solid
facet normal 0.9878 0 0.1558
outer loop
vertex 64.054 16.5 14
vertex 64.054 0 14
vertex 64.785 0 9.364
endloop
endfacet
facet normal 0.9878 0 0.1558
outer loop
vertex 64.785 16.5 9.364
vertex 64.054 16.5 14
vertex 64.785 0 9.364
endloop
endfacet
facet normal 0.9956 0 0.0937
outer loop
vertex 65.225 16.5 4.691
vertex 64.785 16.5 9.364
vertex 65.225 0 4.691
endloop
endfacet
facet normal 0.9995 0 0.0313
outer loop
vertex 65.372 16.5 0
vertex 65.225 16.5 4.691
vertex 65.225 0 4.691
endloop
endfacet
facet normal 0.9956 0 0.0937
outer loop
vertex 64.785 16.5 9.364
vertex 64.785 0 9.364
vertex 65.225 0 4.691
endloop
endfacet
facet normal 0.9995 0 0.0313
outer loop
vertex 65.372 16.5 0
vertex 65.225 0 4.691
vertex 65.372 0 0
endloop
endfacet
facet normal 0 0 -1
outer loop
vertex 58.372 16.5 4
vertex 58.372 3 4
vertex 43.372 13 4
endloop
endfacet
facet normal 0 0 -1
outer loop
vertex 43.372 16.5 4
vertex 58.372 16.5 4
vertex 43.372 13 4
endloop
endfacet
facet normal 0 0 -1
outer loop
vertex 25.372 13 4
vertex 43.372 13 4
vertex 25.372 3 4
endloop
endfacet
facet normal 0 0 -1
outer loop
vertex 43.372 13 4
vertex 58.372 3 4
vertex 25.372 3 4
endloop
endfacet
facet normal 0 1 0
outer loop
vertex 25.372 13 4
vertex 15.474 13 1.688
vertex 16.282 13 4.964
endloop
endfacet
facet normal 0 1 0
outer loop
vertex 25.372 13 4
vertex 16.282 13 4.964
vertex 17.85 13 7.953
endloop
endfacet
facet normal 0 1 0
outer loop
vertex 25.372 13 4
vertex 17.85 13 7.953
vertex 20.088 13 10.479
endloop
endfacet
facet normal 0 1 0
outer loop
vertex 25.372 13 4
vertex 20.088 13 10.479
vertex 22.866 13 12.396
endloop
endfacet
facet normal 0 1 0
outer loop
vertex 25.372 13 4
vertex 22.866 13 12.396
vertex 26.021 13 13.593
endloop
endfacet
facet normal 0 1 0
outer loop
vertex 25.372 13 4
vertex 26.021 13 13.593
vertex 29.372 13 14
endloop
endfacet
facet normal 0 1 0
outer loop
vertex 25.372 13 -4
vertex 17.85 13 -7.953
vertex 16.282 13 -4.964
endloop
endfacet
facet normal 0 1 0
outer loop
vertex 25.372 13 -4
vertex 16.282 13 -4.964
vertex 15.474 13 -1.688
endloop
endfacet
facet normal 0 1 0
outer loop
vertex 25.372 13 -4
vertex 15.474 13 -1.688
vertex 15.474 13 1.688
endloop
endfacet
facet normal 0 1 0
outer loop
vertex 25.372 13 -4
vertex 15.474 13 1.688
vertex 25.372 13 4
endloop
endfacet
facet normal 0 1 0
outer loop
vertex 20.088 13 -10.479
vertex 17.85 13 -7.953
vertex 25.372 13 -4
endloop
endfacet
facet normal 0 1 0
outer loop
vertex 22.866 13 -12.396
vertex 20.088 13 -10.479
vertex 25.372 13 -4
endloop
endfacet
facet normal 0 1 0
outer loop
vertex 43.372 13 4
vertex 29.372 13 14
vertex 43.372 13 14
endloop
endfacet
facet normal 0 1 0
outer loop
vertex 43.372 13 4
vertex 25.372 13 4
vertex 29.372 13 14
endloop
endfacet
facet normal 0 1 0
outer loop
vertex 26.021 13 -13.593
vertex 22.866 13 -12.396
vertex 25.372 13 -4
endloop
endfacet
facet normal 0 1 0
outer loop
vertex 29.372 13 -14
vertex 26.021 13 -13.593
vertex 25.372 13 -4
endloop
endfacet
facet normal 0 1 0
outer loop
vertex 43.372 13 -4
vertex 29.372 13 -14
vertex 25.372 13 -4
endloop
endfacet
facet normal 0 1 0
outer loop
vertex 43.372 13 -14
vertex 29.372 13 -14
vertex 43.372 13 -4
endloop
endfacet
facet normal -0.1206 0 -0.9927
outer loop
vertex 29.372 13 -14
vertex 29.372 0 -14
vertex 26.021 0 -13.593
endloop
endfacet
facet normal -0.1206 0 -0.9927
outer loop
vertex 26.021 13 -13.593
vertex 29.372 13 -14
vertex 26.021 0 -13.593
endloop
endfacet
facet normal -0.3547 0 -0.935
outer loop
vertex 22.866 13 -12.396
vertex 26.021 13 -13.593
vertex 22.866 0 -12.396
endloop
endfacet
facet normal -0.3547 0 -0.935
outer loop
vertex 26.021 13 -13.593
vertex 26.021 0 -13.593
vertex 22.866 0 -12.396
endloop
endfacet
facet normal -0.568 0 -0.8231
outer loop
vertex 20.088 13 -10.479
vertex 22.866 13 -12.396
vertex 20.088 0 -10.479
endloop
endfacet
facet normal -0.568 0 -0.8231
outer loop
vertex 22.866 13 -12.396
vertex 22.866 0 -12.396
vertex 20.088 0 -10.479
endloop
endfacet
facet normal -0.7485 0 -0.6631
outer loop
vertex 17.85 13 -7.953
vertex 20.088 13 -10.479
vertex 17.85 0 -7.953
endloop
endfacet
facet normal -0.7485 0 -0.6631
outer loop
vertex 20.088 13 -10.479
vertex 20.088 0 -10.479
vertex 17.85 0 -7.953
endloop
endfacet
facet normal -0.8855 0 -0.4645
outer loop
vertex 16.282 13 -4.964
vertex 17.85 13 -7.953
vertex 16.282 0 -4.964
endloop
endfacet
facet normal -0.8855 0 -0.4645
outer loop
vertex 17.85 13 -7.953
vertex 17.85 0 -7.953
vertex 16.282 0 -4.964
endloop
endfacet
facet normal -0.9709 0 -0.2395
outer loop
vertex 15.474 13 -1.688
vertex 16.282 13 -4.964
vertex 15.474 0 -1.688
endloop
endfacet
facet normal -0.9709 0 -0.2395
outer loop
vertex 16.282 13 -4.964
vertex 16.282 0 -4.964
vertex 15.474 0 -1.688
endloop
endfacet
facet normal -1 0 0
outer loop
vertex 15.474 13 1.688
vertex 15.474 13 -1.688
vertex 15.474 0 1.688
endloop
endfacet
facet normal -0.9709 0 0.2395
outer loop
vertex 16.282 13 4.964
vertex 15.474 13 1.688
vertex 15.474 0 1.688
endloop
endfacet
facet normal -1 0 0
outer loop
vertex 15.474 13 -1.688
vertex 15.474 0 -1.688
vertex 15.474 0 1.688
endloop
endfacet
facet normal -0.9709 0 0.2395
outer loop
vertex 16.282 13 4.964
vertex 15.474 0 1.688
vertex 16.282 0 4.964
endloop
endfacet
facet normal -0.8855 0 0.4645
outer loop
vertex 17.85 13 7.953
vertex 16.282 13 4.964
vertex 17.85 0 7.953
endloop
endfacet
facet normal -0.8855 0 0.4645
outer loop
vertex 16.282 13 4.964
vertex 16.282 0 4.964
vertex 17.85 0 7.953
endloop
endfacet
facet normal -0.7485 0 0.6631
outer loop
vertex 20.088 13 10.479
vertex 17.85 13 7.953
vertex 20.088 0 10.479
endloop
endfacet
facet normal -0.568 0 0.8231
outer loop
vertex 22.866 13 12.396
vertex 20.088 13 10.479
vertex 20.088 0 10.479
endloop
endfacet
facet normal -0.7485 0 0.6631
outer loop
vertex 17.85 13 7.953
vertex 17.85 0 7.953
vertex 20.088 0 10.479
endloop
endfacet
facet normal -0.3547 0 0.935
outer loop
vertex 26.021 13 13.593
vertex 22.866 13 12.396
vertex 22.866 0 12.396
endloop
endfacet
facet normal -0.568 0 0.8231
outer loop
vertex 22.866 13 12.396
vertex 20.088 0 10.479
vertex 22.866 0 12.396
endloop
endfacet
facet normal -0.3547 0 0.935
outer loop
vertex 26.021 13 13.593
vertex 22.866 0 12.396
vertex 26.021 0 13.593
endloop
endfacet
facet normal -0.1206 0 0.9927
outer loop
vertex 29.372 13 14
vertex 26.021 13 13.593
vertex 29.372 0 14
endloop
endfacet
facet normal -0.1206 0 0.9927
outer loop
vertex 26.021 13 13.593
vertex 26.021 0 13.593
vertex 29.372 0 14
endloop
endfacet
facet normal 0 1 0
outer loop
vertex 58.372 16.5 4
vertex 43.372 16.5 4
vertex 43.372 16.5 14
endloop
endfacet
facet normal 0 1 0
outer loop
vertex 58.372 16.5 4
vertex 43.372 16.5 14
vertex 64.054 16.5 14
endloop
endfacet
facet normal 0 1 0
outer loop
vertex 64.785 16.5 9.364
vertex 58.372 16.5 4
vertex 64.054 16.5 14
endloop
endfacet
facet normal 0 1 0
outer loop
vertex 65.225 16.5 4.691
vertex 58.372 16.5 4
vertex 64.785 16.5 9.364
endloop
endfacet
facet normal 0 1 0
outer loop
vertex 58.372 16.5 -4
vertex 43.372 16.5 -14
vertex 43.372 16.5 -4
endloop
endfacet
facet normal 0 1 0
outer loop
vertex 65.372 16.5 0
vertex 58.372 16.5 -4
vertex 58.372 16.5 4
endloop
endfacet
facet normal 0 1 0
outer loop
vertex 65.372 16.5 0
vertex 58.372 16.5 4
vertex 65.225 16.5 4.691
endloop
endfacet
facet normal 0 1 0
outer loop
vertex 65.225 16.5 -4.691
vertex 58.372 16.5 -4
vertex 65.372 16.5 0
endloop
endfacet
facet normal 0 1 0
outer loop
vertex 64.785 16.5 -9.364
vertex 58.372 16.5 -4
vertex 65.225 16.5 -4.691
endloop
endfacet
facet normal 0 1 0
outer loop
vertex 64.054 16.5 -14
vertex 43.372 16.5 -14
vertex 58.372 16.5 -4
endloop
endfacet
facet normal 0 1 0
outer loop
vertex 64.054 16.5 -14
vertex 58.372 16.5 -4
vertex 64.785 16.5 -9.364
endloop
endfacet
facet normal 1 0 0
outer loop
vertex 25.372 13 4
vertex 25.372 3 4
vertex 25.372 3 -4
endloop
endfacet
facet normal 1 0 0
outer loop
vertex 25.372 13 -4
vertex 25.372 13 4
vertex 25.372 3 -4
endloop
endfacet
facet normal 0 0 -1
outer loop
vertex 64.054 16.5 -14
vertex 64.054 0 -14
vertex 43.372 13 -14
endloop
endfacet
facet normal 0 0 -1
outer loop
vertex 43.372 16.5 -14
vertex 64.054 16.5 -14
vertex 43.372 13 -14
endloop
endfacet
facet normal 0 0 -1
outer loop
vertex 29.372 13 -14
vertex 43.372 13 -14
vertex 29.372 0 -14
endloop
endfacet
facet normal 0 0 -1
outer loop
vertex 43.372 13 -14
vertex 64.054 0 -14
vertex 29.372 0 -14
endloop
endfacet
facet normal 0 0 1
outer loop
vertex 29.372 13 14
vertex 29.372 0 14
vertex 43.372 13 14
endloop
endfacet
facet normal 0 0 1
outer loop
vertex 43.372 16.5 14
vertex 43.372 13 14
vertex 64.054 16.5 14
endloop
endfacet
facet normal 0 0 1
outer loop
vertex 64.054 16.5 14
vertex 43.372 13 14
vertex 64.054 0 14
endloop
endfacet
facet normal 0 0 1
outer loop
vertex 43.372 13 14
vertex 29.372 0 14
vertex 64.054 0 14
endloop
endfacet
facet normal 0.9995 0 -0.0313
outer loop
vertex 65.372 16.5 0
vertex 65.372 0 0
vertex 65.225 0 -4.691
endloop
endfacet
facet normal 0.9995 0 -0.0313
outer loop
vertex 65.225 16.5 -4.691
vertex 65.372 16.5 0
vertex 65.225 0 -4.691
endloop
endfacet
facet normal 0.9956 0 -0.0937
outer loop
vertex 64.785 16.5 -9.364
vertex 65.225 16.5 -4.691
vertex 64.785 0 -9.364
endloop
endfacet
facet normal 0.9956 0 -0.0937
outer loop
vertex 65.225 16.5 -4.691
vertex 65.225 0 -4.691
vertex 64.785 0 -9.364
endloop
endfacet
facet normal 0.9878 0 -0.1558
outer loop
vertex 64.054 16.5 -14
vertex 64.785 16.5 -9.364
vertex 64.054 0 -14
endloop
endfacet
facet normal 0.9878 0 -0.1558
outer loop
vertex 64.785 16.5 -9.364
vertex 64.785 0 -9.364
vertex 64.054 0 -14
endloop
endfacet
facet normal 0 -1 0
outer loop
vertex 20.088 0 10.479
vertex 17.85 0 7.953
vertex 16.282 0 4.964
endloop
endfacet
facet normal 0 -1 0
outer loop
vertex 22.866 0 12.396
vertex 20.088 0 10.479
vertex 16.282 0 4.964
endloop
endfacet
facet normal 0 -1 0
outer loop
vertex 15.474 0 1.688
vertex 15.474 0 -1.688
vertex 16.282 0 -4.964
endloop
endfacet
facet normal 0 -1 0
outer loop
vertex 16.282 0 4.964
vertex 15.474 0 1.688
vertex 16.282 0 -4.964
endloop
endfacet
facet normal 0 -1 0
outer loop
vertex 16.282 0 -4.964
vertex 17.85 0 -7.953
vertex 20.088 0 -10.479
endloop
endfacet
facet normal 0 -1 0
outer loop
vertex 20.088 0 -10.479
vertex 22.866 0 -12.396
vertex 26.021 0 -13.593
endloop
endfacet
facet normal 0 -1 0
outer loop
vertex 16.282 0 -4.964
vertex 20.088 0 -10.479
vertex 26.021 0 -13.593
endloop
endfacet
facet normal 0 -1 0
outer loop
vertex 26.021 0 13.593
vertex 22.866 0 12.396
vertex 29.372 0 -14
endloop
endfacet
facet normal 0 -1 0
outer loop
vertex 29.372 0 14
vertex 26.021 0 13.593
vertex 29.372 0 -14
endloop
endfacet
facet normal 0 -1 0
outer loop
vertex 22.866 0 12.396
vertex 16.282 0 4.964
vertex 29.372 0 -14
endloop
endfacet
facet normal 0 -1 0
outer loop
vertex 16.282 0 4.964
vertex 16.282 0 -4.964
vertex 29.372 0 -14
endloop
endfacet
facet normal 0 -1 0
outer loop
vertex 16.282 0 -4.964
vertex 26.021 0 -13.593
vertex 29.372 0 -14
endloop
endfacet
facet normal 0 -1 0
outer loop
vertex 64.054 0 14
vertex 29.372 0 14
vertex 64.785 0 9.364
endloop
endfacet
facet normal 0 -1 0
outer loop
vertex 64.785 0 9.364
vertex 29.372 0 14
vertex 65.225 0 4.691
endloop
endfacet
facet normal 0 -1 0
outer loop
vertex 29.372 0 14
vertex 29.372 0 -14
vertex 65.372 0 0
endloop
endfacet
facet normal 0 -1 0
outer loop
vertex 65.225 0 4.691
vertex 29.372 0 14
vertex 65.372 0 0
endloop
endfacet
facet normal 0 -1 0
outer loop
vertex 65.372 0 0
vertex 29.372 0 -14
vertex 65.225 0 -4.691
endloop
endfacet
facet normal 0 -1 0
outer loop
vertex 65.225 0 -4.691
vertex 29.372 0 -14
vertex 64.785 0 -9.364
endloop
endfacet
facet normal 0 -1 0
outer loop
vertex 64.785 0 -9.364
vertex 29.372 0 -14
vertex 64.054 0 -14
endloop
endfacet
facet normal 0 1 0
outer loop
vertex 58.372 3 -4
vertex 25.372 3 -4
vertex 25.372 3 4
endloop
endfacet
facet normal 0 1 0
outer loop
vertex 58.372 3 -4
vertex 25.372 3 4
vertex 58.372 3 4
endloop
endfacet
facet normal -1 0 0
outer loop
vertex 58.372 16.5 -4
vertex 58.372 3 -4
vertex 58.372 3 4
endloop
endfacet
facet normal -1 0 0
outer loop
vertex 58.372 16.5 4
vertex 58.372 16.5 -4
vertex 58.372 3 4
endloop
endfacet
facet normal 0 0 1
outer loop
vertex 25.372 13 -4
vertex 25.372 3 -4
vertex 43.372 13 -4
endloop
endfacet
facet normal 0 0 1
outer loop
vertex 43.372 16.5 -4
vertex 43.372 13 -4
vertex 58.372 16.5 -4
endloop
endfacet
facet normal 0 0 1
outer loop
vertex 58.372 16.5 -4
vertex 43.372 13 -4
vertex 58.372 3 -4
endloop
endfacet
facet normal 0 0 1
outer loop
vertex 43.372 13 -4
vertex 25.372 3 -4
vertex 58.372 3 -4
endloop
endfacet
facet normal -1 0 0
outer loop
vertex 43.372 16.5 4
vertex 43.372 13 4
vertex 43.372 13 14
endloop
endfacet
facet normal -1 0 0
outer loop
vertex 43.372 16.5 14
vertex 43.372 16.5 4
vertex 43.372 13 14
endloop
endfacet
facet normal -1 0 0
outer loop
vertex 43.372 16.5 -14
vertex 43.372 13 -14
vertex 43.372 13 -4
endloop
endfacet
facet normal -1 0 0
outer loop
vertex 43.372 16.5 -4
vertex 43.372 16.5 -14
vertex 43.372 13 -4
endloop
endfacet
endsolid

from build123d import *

# Parameters (mm, degrees)
SKETCH1_W           = 33
SKETCH1_H           = 8
BOSS_EXTRUDE1_DEPTH = 3
BOSS_EXTRUDE2_DEPTH = 16.5
BOSS_EXTRUDE3_DEPTH = 13


with BuildPart() as part:
    # Sketch1 → Boss-Extrude1 (new body)
    with BuildSketch(Plane(origin=(0, 0, 0), x_dir=(1, 0, 0), z_dir=(0, 1, 0))):
        with Locations((41.871824735, 0)):
            Rectangle(SKETCH1_W, SKETCH1_H)
    extrude(amount=BOSS_EXTRUDE1_DEPTH)

    # Sketch1<6> → Boss-Extrude2 (add)
    with BuildSketch(Plane(origin=(0, 0, 0), x_dir=(1, 0, 0), z_dir=(0, 1, 0))):
        with BuildLine():
            Line((58.371824735, 4), (58.371824735, -4))
            Line((58.371824735, -4), (43.371824735, -4))
            Line((43.371824735, -4), (43.371824735, -14))
            Line((43.371824735, -14), (64.053572815, -14))
            ThreePointArc((64.053572815, -14), (65.371824735, 0), (64.053572815, 14))
            Line((64.053572815, 14), (43.371824735, 14))
            Line((43.371824735, 14), (43.371824735, 4))
            Line((43.371824735, 4), (58.371824735, 4))
        make_face()
    extrude(amount=BOSS_EXTRUDE2_DEPTH)

    # Sketch1<7> → Boss-Extrude3 (add)
    with BuildSketch(Plane(origin=(0, 0, 0), x_dir=(1, 0, 0), z_dir=(0, 1, 0))):
        with BuildLine():
            Line((25.371824735, -4), (25.371824735, 4))
            Line((25.371824735, 4), (43.371824735, 4))
            Line((43.371824735, 4), (43.371824735, 14))
            Line((43.371824735, 14), (29.371824735, 14))
            ThreePointArc((29.371824735, 14), (15.371824735, 0), (29.371824735, -14))
            Line((29.371824735, -14), (43.371824735, -14))
            Line((43.371824735, -14), (43.371824735, -4))
            Line((43.371824735, -4), (25.371824735, -4))
        make_face()
    extrude(amount=BOSS_EXTRUDE3_DEPTH)


solid = part.part
